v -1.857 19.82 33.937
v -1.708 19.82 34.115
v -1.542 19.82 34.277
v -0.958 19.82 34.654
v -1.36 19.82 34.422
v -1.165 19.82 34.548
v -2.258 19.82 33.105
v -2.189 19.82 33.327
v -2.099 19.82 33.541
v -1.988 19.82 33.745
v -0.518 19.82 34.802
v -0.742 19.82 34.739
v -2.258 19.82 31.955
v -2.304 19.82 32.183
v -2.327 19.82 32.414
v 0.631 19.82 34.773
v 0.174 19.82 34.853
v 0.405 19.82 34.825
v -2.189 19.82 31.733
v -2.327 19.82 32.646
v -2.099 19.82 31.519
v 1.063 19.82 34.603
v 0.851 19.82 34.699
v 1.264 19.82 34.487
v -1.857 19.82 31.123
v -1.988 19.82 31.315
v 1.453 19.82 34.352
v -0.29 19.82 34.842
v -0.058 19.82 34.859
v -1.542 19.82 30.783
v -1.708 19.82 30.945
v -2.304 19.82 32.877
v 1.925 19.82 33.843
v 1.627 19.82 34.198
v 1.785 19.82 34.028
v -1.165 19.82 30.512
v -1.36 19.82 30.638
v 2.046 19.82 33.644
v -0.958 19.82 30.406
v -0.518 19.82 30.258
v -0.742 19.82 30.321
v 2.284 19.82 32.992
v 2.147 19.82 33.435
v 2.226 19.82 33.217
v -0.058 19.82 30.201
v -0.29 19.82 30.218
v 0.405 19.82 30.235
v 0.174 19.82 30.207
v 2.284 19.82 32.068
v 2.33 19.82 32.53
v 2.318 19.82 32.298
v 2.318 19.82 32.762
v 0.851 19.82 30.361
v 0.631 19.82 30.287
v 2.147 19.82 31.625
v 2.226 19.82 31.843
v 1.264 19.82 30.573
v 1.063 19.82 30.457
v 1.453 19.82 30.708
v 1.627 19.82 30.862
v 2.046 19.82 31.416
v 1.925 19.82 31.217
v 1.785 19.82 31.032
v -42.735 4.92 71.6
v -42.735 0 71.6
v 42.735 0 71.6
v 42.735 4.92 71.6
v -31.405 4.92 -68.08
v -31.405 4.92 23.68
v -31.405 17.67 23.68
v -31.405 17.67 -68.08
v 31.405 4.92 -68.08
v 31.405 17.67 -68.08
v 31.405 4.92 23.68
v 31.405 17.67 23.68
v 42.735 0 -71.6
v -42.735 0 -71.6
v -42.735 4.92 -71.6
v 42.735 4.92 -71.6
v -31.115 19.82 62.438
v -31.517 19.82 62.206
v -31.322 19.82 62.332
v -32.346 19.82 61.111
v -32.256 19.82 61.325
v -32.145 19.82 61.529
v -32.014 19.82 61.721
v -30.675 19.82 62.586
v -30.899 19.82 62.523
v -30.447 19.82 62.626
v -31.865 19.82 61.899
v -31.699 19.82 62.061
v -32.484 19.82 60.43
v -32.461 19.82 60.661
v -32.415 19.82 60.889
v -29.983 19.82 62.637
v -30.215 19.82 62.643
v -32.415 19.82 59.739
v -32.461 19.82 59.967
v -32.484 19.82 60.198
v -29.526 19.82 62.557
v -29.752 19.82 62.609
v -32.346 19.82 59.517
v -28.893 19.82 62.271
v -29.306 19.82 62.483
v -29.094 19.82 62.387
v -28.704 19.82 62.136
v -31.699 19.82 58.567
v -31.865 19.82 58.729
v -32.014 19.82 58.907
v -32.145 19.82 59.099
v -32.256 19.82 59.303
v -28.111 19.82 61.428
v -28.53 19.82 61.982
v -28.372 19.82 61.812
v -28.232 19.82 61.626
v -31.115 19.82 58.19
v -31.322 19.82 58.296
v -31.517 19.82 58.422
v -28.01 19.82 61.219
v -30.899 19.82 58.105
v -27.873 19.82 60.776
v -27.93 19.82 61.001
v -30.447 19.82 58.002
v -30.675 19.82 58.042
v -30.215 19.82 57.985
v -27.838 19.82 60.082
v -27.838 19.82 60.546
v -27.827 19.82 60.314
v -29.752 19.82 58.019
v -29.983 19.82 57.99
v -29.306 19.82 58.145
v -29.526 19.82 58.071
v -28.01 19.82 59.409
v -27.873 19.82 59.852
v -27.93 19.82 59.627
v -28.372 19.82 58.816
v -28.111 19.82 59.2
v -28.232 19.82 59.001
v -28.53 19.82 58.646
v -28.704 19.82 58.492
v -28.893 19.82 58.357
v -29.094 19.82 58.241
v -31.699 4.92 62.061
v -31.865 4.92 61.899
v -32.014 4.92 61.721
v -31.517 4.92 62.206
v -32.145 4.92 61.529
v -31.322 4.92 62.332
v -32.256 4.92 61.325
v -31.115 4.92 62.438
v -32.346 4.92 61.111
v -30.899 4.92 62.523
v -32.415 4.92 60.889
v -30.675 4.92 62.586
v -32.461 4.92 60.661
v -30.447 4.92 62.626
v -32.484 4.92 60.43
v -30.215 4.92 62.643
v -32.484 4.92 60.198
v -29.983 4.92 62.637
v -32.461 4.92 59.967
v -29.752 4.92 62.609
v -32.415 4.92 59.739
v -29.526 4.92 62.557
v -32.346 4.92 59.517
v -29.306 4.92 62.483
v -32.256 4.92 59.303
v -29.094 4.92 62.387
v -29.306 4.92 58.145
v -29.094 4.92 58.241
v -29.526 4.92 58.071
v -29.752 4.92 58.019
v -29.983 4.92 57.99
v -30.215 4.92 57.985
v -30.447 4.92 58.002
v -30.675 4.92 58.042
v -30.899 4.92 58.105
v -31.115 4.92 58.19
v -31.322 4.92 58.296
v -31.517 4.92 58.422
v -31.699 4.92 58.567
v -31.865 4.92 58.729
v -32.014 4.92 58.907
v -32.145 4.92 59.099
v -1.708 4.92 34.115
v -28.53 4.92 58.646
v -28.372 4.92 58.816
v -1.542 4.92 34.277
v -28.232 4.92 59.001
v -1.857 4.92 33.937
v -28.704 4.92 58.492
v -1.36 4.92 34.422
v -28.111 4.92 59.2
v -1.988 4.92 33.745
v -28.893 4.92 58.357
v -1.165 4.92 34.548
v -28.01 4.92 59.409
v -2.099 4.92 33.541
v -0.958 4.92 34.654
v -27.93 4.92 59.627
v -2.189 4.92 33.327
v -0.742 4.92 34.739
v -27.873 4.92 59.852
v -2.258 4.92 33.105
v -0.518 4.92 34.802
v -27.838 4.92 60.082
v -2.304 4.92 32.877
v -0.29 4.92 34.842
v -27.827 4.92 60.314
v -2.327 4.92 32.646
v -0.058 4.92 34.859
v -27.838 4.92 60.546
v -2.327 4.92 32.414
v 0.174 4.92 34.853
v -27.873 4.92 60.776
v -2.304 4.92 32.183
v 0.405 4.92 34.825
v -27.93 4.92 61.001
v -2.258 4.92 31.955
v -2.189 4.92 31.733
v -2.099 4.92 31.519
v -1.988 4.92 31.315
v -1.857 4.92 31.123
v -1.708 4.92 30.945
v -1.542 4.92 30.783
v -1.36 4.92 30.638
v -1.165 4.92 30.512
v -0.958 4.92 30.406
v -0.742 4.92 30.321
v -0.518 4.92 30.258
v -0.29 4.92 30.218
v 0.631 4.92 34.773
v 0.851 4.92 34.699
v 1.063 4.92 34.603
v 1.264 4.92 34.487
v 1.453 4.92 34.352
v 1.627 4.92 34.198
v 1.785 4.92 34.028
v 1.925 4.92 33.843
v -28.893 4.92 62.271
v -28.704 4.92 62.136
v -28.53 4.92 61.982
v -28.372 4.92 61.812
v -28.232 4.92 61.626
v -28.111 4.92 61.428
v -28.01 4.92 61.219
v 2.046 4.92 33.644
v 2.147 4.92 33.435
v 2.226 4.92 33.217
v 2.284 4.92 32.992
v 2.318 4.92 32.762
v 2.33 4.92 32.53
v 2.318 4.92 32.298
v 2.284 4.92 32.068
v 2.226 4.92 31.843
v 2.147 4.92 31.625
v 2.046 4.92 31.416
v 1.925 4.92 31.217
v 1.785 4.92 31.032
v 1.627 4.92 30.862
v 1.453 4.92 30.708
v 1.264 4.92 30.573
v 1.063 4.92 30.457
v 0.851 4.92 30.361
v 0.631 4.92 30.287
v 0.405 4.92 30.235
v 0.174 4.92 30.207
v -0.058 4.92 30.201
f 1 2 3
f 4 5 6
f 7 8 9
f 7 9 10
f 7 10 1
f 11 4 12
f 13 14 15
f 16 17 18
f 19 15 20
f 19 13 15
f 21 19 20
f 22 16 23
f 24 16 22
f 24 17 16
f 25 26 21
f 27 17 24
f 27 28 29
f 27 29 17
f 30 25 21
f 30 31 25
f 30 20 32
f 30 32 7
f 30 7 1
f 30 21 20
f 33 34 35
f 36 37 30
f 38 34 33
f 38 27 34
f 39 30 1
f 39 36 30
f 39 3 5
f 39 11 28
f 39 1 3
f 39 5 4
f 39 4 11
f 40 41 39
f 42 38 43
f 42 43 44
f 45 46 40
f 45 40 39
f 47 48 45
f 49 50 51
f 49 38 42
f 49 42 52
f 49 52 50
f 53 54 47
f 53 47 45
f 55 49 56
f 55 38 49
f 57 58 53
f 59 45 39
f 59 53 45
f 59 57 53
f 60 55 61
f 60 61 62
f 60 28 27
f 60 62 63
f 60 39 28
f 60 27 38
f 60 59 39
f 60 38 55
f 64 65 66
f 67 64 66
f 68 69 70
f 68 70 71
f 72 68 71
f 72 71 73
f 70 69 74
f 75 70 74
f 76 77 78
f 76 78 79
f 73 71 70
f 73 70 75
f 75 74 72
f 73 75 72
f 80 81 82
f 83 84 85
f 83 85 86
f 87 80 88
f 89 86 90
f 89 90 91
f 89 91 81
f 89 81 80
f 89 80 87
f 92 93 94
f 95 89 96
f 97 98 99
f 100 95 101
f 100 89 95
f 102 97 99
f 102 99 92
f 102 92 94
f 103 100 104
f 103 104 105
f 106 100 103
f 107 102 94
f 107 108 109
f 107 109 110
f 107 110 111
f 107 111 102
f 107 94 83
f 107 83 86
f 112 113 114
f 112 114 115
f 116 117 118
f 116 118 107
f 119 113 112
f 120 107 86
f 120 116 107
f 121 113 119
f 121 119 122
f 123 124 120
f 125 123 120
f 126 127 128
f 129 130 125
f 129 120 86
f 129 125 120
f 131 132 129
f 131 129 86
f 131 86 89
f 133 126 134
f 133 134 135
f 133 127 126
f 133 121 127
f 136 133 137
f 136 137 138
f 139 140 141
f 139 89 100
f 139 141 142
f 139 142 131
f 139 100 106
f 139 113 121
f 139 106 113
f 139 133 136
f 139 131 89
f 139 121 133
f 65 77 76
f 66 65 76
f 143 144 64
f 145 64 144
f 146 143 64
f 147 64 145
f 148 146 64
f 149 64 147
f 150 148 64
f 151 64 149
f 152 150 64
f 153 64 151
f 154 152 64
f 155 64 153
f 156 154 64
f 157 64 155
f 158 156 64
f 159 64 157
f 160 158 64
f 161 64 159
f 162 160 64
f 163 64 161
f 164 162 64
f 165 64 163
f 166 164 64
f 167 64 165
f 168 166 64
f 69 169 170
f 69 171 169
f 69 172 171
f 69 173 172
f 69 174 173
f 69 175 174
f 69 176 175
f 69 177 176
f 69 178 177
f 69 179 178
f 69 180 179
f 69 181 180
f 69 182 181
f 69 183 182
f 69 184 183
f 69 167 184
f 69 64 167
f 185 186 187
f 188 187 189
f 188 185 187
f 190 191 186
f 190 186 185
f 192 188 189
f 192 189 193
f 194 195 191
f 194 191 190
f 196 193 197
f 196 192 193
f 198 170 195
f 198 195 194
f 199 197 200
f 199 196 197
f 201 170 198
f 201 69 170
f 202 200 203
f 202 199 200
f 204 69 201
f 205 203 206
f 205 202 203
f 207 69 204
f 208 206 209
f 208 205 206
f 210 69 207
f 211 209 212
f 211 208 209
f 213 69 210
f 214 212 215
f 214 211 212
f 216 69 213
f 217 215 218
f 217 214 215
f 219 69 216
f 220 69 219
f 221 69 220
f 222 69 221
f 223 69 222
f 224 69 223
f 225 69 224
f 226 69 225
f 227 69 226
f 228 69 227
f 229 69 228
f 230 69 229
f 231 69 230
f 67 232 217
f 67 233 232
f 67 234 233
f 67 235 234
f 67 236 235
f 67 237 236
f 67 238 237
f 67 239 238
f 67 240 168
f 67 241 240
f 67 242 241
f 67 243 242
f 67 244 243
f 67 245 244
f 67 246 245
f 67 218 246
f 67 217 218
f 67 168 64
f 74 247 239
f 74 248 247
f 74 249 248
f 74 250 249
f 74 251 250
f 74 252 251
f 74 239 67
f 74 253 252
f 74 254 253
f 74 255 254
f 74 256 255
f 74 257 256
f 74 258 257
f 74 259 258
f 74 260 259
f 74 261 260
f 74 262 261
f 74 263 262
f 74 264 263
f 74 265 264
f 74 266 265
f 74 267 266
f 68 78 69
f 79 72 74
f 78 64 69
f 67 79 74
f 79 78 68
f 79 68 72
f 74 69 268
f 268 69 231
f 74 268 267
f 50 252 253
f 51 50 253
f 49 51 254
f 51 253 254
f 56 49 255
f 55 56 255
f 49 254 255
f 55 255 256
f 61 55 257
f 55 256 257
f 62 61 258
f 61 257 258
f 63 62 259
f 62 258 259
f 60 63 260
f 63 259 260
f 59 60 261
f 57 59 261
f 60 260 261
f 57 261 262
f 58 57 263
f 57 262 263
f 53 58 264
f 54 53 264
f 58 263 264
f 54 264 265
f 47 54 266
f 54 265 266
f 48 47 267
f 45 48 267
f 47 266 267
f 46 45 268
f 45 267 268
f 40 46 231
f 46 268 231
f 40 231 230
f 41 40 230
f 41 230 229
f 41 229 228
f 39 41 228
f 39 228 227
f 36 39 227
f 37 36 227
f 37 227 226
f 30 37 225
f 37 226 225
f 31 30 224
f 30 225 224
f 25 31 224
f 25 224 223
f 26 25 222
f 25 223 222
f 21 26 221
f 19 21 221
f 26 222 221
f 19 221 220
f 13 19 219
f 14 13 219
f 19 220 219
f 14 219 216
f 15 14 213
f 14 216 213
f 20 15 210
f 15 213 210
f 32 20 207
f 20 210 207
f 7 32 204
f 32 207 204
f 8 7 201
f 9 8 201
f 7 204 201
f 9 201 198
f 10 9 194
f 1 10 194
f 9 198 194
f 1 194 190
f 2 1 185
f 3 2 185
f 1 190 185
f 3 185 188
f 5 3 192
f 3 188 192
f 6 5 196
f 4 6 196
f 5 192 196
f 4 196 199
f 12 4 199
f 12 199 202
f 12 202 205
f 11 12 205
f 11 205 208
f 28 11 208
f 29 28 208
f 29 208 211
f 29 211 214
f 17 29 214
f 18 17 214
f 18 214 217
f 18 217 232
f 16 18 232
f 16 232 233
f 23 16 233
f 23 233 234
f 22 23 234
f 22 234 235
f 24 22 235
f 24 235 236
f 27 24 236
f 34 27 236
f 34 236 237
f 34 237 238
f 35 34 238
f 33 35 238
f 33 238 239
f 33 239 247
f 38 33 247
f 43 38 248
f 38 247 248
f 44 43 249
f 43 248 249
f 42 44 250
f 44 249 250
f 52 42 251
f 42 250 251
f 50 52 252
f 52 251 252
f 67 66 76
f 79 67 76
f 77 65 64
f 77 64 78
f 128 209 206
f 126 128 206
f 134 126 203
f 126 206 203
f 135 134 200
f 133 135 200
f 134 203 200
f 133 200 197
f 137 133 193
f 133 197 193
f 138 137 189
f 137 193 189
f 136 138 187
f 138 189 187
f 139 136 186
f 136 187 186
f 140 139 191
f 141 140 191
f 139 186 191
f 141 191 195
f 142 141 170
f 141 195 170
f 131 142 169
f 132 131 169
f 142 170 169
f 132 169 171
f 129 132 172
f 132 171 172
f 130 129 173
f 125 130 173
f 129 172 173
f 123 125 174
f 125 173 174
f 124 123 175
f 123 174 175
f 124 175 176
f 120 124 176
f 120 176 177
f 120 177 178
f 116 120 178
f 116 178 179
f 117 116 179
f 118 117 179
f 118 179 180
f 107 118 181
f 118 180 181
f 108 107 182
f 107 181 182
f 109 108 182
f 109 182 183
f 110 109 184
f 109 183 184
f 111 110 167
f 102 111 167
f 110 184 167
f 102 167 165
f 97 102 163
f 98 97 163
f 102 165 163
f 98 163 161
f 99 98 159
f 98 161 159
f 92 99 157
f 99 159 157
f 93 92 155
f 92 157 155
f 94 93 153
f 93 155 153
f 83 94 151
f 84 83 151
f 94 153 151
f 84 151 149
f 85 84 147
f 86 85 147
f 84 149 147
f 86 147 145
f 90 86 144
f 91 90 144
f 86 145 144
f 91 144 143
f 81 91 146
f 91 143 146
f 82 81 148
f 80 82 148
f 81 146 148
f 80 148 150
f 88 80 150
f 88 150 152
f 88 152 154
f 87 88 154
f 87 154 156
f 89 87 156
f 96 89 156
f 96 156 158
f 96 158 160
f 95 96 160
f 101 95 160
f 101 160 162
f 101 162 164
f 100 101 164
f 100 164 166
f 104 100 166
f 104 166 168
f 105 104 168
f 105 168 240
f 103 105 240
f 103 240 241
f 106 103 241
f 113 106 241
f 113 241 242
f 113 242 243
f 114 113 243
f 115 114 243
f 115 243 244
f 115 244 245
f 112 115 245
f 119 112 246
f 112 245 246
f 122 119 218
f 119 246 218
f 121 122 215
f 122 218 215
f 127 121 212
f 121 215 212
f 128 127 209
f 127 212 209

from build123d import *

# Parameters (mm, degrees)
SKETCH1_W           = 85.47
SKETCH1_H           = 143.2
BOSS_EXTRUDE1_DEPTH = 4.92
SKETCH2_W           = 62.81
SKETCH2_H           = 91.76
BOSS_EXTRUDE2_DEPTH = 12.75
SKETCH3_R           = 2.33
BOSS_EXTRUDE3_DEPTH = 14.9


with BuildPart() as part:
    # Sketch1 → Boss-Extrude1 (new body)
    with BuildSketch(Plane(origin=(0, 0, 0), x_dir=(1, 0, 0), z_dir=(0, 1, 0))):
        Rectangle(SKETCH1_W, SKETCH1_H)
    extrude(amount=BOSS_EXTRUDE1_DEPTH)

    # Sketch2 → Boss-Extrude2 (add)
    with BuildSketch(Plane(origin=(0, 4.92, 0), x_dir=(1, 0, 0), z_dir=(0, 1, 0))):
        with Locations((0, 22.2)):
            Rectangle(SKETCH2_W, SKETCH2_H)
    extrude(amount=BOSS_EXTRUDE2_DEPTH)

    # Sketch3 → Boss-Extrude3 (add)
    with BuildSketch(Plane(origin=(0, 4.92, 0), x_dir=(1, 0, 0), z_dir=(0, 1, 0))):
        with Locations((0, -32.53)):
            Circle(SKETCH3_R)
        with Locations((-30.156916038, -60.313935435)):
            Circle(SKETCH3_R)
    extrude(amount=BOSS_EXTRUDE3_DEPTH)


solid = part.part
